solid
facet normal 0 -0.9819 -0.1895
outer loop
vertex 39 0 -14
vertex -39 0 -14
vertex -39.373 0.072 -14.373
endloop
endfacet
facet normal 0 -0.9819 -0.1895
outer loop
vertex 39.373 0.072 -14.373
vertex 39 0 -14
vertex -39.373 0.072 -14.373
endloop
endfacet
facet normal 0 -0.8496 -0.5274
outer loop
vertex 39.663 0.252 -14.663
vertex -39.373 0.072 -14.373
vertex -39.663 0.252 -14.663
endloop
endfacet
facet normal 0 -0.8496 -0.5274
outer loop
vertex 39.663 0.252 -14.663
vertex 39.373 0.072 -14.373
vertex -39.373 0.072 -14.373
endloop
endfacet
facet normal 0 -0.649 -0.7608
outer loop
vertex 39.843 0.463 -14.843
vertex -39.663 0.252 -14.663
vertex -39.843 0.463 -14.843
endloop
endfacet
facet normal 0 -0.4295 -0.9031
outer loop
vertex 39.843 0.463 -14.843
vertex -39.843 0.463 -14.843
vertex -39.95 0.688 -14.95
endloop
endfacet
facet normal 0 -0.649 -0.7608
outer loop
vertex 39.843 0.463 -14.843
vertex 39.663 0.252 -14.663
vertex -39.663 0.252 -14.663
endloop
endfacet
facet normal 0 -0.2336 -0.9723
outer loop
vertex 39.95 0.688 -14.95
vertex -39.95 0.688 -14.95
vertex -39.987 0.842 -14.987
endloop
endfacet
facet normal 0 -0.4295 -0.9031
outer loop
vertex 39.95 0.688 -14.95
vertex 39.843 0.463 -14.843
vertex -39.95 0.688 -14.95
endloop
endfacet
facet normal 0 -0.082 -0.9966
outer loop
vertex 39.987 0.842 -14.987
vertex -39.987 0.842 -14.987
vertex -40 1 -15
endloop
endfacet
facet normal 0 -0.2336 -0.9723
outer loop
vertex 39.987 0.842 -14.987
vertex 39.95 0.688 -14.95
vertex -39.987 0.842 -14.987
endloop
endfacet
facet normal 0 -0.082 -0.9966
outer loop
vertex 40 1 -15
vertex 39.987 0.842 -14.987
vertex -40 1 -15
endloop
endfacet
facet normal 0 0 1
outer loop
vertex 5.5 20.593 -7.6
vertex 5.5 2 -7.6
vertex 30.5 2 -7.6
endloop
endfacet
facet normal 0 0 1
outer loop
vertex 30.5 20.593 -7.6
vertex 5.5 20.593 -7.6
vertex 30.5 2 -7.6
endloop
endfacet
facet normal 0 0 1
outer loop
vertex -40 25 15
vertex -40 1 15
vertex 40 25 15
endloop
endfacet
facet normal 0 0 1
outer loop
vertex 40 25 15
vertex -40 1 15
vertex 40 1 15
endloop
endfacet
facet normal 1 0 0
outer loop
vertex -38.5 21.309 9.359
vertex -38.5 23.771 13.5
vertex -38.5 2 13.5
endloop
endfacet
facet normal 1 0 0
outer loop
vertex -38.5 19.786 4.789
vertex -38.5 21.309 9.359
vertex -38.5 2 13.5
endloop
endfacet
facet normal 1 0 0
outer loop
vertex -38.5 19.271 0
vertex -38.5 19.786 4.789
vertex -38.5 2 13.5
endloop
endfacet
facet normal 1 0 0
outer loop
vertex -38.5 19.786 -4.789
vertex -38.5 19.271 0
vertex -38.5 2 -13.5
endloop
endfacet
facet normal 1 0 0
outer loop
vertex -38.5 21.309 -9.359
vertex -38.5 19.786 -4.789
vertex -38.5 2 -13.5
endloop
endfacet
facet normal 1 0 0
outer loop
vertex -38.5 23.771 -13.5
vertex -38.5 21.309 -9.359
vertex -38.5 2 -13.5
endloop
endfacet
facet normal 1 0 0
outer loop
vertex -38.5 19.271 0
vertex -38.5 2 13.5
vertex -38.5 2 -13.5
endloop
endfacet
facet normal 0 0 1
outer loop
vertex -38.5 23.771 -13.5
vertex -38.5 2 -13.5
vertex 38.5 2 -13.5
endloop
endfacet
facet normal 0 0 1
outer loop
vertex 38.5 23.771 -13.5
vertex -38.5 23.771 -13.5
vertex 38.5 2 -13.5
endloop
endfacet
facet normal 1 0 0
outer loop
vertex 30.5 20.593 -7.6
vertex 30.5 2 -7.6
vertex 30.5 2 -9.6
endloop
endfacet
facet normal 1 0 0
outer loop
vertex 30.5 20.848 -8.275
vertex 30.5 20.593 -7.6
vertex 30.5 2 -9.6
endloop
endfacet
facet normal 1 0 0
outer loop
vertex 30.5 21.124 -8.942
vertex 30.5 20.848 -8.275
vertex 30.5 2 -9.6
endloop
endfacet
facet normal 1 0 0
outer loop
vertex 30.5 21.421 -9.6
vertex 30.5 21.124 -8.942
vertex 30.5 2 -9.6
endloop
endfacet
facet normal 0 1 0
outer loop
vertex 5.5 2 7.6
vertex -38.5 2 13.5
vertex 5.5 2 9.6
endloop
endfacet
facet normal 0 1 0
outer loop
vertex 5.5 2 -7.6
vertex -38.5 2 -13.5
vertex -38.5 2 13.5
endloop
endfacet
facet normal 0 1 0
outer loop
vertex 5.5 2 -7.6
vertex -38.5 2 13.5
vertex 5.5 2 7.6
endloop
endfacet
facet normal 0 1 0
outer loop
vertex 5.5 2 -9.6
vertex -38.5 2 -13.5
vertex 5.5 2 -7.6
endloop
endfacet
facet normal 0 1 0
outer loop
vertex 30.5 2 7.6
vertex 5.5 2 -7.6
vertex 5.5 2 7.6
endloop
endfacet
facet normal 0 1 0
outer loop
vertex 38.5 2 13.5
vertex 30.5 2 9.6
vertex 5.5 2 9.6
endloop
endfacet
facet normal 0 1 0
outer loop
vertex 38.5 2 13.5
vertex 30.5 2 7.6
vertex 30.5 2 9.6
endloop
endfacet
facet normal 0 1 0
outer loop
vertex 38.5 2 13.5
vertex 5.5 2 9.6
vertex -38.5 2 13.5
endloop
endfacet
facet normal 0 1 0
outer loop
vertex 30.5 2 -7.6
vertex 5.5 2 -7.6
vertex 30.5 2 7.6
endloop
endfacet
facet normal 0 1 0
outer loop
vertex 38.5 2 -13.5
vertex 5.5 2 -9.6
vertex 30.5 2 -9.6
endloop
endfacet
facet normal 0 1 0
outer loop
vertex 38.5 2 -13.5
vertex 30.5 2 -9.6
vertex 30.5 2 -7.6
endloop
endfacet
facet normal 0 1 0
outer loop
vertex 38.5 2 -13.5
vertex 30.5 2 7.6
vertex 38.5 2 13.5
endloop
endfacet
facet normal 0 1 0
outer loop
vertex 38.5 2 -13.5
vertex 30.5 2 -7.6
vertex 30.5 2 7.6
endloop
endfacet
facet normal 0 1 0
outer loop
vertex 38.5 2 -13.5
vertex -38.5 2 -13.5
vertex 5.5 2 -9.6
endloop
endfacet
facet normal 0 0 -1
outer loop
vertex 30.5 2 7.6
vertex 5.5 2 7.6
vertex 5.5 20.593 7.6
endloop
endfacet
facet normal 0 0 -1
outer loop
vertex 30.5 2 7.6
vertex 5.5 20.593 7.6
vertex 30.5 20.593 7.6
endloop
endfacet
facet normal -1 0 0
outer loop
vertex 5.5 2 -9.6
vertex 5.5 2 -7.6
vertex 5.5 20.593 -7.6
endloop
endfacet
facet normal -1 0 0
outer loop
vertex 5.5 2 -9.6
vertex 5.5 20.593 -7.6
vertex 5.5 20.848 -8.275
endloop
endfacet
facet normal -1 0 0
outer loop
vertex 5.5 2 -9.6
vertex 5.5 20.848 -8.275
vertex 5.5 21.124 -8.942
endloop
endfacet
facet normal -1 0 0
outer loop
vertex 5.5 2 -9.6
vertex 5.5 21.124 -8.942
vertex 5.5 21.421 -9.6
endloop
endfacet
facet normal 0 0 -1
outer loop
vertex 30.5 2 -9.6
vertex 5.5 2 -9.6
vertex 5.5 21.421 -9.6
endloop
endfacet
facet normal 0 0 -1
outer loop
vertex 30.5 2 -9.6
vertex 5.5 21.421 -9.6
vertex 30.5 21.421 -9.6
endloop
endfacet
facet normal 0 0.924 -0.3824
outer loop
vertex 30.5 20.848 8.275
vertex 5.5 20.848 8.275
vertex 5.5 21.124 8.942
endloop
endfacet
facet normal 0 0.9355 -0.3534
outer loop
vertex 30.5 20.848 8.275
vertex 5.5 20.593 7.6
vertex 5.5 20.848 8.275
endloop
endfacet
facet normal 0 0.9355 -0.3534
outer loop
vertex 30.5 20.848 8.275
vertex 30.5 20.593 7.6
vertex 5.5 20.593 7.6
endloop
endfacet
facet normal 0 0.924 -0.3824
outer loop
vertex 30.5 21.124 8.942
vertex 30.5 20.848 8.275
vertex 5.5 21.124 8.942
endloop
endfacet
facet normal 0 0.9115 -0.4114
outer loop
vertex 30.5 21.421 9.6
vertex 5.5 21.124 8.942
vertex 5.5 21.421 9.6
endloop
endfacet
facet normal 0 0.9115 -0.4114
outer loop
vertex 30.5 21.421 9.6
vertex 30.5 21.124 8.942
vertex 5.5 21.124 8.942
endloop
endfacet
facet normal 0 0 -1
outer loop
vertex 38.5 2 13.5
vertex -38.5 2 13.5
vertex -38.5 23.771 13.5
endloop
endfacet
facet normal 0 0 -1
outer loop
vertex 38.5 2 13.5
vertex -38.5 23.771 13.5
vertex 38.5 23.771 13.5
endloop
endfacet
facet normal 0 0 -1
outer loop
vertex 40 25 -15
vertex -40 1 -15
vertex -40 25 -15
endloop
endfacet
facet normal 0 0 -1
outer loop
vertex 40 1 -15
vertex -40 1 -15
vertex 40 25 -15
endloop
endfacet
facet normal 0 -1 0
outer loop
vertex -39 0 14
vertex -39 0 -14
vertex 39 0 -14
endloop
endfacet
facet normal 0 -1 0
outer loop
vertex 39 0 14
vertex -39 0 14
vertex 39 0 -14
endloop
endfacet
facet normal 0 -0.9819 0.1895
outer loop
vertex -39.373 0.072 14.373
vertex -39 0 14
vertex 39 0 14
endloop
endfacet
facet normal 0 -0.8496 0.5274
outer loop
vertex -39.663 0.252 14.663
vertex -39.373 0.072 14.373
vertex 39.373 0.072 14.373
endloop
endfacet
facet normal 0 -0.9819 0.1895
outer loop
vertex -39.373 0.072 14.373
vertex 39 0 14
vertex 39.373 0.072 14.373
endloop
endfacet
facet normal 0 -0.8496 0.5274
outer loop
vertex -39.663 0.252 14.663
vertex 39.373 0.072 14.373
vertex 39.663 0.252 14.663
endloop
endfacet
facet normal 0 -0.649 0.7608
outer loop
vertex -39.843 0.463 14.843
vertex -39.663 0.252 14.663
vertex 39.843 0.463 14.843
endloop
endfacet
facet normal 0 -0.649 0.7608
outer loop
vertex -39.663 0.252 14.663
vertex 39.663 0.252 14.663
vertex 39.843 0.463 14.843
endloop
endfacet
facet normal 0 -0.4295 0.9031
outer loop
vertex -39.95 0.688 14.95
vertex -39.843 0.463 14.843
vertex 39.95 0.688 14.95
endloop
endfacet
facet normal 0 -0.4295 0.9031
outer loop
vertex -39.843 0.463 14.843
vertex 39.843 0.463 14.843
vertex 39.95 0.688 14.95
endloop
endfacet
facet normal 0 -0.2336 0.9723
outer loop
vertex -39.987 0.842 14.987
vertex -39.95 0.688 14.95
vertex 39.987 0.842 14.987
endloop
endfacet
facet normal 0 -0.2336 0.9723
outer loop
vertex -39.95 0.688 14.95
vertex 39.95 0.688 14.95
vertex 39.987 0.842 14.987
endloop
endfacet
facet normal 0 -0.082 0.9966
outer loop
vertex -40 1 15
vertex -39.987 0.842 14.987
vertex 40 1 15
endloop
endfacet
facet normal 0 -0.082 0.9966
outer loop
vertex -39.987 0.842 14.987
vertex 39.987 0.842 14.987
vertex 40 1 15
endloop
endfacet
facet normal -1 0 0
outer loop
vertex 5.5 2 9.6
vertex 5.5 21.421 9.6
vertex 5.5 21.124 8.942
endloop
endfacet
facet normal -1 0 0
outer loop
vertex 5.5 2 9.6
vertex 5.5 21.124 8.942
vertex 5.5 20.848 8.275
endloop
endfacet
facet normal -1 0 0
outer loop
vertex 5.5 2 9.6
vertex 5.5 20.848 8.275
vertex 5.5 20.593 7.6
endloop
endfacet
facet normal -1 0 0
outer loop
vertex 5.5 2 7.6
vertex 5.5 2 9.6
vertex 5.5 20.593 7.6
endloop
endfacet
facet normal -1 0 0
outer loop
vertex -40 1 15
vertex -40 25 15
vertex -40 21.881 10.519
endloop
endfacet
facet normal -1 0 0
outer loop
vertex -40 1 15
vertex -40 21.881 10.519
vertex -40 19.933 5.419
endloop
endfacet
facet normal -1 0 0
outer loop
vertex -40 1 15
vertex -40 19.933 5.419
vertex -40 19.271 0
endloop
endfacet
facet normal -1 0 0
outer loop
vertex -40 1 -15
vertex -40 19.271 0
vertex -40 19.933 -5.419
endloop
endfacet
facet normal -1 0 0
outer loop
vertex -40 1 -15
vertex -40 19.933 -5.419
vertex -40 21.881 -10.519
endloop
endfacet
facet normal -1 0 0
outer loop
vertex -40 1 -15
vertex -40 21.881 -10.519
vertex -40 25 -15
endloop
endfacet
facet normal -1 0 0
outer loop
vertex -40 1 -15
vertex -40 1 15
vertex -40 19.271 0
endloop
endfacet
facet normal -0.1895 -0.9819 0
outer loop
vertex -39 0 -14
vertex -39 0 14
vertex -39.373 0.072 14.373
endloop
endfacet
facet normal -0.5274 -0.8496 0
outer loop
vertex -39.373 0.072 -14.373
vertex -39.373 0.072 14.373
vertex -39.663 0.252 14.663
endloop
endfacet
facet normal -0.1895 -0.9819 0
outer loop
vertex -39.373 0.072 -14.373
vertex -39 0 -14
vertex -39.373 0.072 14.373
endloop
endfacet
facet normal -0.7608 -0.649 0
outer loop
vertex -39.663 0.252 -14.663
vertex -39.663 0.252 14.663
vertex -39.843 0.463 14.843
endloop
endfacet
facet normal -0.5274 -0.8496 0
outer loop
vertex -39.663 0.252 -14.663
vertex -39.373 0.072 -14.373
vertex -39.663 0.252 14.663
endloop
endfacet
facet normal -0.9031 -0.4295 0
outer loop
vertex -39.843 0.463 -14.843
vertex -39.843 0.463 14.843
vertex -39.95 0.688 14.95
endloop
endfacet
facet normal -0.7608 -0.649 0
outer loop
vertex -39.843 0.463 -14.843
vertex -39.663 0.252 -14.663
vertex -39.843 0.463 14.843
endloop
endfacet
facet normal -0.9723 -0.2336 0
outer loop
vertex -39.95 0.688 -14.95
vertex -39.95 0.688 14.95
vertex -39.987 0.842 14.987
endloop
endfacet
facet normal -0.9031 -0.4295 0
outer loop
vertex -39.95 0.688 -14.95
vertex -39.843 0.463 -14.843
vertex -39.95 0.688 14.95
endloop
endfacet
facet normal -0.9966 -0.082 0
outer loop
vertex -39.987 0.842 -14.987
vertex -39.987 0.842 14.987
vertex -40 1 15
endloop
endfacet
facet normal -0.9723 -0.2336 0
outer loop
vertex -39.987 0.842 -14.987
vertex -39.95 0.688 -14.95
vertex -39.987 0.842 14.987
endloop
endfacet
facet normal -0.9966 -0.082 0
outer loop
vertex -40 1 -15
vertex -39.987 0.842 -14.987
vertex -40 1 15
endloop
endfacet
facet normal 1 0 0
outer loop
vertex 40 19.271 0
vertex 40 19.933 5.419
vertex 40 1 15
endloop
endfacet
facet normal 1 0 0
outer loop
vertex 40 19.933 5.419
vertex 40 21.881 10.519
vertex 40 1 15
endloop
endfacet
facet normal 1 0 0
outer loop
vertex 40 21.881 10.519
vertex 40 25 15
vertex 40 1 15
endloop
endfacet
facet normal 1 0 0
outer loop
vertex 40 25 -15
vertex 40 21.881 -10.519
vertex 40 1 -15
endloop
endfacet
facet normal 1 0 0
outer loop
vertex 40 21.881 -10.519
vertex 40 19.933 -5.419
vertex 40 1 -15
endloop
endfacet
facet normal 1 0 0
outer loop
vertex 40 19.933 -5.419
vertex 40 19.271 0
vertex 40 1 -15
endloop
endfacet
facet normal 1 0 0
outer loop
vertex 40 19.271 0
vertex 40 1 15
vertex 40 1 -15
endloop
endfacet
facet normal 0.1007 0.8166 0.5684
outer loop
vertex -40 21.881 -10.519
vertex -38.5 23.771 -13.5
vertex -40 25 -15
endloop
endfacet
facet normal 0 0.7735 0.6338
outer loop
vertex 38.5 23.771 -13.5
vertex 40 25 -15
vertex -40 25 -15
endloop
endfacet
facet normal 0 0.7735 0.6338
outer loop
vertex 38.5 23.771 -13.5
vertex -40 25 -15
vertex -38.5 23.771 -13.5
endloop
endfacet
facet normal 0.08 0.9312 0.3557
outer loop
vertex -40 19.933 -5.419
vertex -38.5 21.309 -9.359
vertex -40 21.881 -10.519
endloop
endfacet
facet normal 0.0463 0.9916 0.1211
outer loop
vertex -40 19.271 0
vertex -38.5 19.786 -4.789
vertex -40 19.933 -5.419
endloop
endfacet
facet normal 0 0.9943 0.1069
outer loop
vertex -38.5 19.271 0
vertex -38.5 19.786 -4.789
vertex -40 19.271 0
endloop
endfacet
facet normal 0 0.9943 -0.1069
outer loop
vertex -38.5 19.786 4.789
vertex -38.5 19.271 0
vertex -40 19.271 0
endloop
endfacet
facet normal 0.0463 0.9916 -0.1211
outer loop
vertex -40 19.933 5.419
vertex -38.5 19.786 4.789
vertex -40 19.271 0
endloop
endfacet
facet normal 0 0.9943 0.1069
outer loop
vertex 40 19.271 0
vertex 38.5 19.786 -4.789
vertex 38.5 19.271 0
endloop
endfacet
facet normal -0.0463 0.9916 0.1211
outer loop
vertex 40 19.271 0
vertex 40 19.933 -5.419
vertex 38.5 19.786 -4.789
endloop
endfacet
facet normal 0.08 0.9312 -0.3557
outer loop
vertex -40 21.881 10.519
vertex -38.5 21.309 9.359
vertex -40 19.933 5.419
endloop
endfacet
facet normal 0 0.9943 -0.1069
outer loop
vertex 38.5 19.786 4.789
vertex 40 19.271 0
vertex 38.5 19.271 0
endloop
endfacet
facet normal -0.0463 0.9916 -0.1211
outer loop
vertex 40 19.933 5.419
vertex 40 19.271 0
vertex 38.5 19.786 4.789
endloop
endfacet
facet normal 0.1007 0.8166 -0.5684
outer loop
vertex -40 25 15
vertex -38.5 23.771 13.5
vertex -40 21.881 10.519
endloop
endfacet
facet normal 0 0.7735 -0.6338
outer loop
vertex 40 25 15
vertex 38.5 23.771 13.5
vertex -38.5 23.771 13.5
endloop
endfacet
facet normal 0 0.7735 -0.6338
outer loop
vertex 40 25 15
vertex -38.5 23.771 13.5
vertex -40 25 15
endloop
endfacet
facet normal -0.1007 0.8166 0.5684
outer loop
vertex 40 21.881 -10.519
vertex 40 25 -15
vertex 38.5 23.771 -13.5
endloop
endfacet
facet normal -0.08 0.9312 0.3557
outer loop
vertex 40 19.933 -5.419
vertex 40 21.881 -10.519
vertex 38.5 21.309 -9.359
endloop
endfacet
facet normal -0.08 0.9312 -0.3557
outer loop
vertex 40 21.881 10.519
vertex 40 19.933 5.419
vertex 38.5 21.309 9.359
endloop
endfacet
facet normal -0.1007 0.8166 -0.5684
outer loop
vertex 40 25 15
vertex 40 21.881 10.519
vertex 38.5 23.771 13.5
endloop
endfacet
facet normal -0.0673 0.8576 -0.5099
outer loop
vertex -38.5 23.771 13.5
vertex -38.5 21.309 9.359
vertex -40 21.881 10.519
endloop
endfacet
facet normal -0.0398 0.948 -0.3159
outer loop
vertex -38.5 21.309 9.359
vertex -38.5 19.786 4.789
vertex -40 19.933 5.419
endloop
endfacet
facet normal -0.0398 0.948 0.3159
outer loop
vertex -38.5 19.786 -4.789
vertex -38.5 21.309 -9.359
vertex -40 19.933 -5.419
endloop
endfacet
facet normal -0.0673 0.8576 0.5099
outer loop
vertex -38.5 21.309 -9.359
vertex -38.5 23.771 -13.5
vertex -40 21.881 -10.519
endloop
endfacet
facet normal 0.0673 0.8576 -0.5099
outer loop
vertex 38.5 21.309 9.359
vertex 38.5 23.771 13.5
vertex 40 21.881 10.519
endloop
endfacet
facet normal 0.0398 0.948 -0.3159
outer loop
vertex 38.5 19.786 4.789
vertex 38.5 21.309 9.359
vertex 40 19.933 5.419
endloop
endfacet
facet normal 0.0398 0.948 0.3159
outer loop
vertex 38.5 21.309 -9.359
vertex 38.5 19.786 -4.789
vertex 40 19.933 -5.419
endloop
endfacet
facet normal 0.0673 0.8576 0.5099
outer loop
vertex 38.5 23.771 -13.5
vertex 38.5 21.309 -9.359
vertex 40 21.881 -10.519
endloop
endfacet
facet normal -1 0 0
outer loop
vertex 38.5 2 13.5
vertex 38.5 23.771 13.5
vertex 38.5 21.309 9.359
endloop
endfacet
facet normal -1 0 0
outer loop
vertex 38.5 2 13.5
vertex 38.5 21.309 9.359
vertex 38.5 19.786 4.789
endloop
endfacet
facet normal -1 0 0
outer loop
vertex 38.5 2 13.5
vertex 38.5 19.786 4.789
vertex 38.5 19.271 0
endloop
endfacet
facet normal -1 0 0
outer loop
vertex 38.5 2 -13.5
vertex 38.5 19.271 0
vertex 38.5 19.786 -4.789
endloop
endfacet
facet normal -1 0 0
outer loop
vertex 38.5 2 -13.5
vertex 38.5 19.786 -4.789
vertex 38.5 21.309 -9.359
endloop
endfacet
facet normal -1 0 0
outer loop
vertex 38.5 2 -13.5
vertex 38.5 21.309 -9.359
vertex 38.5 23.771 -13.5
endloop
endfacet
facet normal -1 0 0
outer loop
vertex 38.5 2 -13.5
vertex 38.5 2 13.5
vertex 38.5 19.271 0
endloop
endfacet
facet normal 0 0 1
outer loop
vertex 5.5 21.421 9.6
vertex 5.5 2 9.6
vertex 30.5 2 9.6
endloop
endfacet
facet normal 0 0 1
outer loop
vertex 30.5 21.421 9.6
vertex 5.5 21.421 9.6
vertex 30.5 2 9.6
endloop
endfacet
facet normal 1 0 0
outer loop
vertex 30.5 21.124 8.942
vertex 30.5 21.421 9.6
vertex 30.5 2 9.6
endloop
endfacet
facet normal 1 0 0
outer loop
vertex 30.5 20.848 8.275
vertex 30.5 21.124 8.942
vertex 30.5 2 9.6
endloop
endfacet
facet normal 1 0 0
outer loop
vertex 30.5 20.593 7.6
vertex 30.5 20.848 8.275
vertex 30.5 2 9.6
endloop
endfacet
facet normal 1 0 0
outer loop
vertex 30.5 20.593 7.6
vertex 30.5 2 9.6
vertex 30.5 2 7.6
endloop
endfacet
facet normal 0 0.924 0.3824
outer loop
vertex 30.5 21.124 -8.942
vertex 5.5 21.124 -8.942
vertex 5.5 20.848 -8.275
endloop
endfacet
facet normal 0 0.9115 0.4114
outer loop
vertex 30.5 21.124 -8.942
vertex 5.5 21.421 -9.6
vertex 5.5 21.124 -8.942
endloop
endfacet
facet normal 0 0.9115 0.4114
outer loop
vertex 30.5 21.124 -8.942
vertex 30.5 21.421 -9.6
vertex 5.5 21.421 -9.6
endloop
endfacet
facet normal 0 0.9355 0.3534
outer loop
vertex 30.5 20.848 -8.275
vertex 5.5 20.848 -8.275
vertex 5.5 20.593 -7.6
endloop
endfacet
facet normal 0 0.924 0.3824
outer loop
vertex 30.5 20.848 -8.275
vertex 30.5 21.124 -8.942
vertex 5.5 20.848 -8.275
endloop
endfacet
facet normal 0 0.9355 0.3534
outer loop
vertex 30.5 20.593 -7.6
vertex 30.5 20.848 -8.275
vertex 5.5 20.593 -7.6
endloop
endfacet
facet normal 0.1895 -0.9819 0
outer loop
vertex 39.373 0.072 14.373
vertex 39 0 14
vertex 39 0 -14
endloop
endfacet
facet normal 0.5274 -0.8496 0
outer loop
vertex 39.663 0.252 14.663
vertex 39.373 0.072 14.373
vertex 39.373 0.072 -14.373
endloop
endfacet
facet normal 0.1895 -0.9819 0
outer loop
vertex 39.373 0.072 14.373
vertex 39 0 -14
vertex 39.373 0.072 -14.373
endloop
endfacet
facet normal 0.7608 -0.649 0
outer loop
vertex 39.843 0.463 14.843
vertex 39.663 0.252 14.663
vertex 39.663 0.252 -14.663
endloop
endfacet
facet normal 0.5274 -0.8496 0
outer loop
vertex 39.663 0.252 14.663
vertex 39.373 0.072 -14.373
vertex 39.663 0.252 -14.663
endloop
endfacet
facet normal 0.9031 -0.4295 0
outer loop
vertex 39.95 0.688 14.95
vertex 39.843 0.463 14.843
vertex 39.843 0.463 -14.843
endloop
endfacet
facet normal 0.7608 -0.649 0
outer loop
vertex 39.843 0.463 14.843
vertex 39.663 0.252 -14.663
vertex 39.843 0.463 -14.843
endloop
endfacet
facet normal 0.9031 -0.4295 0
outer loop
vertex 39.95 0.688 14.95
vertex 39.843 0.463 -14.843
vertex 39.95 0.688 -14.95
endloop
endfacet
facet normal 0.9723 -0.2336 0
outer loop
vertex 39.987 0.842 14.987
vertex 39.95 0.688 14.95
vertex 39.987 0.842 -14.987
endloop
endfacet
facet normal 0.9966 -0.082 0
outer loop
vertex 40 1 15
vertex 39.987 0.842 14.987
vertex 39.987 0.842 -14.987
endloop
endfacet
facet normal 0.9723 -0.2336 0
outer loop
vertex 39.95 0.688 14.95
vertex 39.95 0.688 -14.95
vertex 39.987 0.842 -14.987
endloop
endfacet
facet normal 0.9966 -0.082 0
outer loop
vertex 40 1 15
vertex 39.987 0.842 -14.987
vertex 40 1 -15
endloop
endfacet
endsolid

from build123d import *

# Parameters (mm, degrees)
SKETCH1_W           = 80
SKETCH1_H           = 30
SKETCH1_W_2         = 77
SKETCH1_H_2         = 27
BOSS_EXTRUDE1_DEPTH = 2
SKETCH1_3_W         = 80
SKETCH1_3_H         = 30
SKETCH1_3_W_2       = 77
SKETCH1_3_H_2       = 27
BOSS_EXTRUDE2_DEPTH = 25
SKETCH2_W           = 25
SKETCH2_H           = 2
BOSS_EXTRUDE3_DEPTH = 23
CUT_EXTRUDE1_DEPTH  = 86.14693183
FILLET1_R           = 1


with BuildPart() as part:
    # Sketch1 → Boss-Extrude1 (new body)
    # profile 1 of 2: a face of its own
    with BuildSketch(Plane(origin=(0, 0, 0), x_dir=(1, 0, 0), z_dir=(0, 1, 0))):
        Rectangle(SKETCH1_W, SKETCH1_H)
        Rectangle(SKETCH1_W_2, SKETCH1_H_2, mode=Mode.SUBTRACT)
    # profile 2 of 2: a face of its own
    with BuildSketch(Plane(origin=(0, 0, 0), x_dir=(1, 0, 0), z_dir=(0, 1, 0))):
        Rectangle(SKETCH1_W_2, SKETCH1_H_2)
    extrude(amount=BOSS_EXTRUDE1_DEPTH)

    # Sketch1<3> → Boss-Extrude2 (add)
    with BuildSketch(Plane(origin=(0, 0, 0), x_dir=(1, 0, 0), z_dir=(0, 1, 0))):
        Rectangle(SKETCH1_3_W, SKETCH1_3_H)
        Rectangle(SKETCH1_3_W_2, SKETCH1_3_H_2, mode=Mode.SUBTRACT)
    extrude(amount=BOSS_EXTRUDE2_DEPTH)

    # Sketch2 → Boss-Extrude3 (add)
    with BuildSketch(Plane(origin=(0, 2, 0), x_dir=(1, 0, 0), z_dir=(0, 1, 0))):
        with Locations((18, 8.6)):
            Rectangle(SKETCH2_W, SKETCH2_H)
        with Locations((18, -8.6)):
            Rectangle(SKETCH2_W, SKETCH2_H)
    extrude(amount=BOSS_EXTRUDE3_DEPTH)

    # Sketch3 → Cut-Extrude1 (cut, through all)
    with BuildSketch(Plane(origin=(40, 0, 0), x_dir=(0, 0, -1), z_dir=(1, 0, 0))):
        with BuildLine():
            Line((-15, 25), (15, 25))
            ThreePointArc((15, 25), (0, 19.270509831), (-15, 25))
        make_face()
    extrude(amount=-CUT_EXTRUDE1_DEPTH, mode=Mode.SUBTRACT)

    # Fillet1
    fillet1_edges = [part.edges().sort_by_distance(p)[0] for p in [
        (-40, 0, 0),
        (0, 0, -15),
        (40, 0, 0),
        (0, 0, 15),
    ]]
    fillet(fillet1_edges, radius=FILLET1_R)


solid = part.part
